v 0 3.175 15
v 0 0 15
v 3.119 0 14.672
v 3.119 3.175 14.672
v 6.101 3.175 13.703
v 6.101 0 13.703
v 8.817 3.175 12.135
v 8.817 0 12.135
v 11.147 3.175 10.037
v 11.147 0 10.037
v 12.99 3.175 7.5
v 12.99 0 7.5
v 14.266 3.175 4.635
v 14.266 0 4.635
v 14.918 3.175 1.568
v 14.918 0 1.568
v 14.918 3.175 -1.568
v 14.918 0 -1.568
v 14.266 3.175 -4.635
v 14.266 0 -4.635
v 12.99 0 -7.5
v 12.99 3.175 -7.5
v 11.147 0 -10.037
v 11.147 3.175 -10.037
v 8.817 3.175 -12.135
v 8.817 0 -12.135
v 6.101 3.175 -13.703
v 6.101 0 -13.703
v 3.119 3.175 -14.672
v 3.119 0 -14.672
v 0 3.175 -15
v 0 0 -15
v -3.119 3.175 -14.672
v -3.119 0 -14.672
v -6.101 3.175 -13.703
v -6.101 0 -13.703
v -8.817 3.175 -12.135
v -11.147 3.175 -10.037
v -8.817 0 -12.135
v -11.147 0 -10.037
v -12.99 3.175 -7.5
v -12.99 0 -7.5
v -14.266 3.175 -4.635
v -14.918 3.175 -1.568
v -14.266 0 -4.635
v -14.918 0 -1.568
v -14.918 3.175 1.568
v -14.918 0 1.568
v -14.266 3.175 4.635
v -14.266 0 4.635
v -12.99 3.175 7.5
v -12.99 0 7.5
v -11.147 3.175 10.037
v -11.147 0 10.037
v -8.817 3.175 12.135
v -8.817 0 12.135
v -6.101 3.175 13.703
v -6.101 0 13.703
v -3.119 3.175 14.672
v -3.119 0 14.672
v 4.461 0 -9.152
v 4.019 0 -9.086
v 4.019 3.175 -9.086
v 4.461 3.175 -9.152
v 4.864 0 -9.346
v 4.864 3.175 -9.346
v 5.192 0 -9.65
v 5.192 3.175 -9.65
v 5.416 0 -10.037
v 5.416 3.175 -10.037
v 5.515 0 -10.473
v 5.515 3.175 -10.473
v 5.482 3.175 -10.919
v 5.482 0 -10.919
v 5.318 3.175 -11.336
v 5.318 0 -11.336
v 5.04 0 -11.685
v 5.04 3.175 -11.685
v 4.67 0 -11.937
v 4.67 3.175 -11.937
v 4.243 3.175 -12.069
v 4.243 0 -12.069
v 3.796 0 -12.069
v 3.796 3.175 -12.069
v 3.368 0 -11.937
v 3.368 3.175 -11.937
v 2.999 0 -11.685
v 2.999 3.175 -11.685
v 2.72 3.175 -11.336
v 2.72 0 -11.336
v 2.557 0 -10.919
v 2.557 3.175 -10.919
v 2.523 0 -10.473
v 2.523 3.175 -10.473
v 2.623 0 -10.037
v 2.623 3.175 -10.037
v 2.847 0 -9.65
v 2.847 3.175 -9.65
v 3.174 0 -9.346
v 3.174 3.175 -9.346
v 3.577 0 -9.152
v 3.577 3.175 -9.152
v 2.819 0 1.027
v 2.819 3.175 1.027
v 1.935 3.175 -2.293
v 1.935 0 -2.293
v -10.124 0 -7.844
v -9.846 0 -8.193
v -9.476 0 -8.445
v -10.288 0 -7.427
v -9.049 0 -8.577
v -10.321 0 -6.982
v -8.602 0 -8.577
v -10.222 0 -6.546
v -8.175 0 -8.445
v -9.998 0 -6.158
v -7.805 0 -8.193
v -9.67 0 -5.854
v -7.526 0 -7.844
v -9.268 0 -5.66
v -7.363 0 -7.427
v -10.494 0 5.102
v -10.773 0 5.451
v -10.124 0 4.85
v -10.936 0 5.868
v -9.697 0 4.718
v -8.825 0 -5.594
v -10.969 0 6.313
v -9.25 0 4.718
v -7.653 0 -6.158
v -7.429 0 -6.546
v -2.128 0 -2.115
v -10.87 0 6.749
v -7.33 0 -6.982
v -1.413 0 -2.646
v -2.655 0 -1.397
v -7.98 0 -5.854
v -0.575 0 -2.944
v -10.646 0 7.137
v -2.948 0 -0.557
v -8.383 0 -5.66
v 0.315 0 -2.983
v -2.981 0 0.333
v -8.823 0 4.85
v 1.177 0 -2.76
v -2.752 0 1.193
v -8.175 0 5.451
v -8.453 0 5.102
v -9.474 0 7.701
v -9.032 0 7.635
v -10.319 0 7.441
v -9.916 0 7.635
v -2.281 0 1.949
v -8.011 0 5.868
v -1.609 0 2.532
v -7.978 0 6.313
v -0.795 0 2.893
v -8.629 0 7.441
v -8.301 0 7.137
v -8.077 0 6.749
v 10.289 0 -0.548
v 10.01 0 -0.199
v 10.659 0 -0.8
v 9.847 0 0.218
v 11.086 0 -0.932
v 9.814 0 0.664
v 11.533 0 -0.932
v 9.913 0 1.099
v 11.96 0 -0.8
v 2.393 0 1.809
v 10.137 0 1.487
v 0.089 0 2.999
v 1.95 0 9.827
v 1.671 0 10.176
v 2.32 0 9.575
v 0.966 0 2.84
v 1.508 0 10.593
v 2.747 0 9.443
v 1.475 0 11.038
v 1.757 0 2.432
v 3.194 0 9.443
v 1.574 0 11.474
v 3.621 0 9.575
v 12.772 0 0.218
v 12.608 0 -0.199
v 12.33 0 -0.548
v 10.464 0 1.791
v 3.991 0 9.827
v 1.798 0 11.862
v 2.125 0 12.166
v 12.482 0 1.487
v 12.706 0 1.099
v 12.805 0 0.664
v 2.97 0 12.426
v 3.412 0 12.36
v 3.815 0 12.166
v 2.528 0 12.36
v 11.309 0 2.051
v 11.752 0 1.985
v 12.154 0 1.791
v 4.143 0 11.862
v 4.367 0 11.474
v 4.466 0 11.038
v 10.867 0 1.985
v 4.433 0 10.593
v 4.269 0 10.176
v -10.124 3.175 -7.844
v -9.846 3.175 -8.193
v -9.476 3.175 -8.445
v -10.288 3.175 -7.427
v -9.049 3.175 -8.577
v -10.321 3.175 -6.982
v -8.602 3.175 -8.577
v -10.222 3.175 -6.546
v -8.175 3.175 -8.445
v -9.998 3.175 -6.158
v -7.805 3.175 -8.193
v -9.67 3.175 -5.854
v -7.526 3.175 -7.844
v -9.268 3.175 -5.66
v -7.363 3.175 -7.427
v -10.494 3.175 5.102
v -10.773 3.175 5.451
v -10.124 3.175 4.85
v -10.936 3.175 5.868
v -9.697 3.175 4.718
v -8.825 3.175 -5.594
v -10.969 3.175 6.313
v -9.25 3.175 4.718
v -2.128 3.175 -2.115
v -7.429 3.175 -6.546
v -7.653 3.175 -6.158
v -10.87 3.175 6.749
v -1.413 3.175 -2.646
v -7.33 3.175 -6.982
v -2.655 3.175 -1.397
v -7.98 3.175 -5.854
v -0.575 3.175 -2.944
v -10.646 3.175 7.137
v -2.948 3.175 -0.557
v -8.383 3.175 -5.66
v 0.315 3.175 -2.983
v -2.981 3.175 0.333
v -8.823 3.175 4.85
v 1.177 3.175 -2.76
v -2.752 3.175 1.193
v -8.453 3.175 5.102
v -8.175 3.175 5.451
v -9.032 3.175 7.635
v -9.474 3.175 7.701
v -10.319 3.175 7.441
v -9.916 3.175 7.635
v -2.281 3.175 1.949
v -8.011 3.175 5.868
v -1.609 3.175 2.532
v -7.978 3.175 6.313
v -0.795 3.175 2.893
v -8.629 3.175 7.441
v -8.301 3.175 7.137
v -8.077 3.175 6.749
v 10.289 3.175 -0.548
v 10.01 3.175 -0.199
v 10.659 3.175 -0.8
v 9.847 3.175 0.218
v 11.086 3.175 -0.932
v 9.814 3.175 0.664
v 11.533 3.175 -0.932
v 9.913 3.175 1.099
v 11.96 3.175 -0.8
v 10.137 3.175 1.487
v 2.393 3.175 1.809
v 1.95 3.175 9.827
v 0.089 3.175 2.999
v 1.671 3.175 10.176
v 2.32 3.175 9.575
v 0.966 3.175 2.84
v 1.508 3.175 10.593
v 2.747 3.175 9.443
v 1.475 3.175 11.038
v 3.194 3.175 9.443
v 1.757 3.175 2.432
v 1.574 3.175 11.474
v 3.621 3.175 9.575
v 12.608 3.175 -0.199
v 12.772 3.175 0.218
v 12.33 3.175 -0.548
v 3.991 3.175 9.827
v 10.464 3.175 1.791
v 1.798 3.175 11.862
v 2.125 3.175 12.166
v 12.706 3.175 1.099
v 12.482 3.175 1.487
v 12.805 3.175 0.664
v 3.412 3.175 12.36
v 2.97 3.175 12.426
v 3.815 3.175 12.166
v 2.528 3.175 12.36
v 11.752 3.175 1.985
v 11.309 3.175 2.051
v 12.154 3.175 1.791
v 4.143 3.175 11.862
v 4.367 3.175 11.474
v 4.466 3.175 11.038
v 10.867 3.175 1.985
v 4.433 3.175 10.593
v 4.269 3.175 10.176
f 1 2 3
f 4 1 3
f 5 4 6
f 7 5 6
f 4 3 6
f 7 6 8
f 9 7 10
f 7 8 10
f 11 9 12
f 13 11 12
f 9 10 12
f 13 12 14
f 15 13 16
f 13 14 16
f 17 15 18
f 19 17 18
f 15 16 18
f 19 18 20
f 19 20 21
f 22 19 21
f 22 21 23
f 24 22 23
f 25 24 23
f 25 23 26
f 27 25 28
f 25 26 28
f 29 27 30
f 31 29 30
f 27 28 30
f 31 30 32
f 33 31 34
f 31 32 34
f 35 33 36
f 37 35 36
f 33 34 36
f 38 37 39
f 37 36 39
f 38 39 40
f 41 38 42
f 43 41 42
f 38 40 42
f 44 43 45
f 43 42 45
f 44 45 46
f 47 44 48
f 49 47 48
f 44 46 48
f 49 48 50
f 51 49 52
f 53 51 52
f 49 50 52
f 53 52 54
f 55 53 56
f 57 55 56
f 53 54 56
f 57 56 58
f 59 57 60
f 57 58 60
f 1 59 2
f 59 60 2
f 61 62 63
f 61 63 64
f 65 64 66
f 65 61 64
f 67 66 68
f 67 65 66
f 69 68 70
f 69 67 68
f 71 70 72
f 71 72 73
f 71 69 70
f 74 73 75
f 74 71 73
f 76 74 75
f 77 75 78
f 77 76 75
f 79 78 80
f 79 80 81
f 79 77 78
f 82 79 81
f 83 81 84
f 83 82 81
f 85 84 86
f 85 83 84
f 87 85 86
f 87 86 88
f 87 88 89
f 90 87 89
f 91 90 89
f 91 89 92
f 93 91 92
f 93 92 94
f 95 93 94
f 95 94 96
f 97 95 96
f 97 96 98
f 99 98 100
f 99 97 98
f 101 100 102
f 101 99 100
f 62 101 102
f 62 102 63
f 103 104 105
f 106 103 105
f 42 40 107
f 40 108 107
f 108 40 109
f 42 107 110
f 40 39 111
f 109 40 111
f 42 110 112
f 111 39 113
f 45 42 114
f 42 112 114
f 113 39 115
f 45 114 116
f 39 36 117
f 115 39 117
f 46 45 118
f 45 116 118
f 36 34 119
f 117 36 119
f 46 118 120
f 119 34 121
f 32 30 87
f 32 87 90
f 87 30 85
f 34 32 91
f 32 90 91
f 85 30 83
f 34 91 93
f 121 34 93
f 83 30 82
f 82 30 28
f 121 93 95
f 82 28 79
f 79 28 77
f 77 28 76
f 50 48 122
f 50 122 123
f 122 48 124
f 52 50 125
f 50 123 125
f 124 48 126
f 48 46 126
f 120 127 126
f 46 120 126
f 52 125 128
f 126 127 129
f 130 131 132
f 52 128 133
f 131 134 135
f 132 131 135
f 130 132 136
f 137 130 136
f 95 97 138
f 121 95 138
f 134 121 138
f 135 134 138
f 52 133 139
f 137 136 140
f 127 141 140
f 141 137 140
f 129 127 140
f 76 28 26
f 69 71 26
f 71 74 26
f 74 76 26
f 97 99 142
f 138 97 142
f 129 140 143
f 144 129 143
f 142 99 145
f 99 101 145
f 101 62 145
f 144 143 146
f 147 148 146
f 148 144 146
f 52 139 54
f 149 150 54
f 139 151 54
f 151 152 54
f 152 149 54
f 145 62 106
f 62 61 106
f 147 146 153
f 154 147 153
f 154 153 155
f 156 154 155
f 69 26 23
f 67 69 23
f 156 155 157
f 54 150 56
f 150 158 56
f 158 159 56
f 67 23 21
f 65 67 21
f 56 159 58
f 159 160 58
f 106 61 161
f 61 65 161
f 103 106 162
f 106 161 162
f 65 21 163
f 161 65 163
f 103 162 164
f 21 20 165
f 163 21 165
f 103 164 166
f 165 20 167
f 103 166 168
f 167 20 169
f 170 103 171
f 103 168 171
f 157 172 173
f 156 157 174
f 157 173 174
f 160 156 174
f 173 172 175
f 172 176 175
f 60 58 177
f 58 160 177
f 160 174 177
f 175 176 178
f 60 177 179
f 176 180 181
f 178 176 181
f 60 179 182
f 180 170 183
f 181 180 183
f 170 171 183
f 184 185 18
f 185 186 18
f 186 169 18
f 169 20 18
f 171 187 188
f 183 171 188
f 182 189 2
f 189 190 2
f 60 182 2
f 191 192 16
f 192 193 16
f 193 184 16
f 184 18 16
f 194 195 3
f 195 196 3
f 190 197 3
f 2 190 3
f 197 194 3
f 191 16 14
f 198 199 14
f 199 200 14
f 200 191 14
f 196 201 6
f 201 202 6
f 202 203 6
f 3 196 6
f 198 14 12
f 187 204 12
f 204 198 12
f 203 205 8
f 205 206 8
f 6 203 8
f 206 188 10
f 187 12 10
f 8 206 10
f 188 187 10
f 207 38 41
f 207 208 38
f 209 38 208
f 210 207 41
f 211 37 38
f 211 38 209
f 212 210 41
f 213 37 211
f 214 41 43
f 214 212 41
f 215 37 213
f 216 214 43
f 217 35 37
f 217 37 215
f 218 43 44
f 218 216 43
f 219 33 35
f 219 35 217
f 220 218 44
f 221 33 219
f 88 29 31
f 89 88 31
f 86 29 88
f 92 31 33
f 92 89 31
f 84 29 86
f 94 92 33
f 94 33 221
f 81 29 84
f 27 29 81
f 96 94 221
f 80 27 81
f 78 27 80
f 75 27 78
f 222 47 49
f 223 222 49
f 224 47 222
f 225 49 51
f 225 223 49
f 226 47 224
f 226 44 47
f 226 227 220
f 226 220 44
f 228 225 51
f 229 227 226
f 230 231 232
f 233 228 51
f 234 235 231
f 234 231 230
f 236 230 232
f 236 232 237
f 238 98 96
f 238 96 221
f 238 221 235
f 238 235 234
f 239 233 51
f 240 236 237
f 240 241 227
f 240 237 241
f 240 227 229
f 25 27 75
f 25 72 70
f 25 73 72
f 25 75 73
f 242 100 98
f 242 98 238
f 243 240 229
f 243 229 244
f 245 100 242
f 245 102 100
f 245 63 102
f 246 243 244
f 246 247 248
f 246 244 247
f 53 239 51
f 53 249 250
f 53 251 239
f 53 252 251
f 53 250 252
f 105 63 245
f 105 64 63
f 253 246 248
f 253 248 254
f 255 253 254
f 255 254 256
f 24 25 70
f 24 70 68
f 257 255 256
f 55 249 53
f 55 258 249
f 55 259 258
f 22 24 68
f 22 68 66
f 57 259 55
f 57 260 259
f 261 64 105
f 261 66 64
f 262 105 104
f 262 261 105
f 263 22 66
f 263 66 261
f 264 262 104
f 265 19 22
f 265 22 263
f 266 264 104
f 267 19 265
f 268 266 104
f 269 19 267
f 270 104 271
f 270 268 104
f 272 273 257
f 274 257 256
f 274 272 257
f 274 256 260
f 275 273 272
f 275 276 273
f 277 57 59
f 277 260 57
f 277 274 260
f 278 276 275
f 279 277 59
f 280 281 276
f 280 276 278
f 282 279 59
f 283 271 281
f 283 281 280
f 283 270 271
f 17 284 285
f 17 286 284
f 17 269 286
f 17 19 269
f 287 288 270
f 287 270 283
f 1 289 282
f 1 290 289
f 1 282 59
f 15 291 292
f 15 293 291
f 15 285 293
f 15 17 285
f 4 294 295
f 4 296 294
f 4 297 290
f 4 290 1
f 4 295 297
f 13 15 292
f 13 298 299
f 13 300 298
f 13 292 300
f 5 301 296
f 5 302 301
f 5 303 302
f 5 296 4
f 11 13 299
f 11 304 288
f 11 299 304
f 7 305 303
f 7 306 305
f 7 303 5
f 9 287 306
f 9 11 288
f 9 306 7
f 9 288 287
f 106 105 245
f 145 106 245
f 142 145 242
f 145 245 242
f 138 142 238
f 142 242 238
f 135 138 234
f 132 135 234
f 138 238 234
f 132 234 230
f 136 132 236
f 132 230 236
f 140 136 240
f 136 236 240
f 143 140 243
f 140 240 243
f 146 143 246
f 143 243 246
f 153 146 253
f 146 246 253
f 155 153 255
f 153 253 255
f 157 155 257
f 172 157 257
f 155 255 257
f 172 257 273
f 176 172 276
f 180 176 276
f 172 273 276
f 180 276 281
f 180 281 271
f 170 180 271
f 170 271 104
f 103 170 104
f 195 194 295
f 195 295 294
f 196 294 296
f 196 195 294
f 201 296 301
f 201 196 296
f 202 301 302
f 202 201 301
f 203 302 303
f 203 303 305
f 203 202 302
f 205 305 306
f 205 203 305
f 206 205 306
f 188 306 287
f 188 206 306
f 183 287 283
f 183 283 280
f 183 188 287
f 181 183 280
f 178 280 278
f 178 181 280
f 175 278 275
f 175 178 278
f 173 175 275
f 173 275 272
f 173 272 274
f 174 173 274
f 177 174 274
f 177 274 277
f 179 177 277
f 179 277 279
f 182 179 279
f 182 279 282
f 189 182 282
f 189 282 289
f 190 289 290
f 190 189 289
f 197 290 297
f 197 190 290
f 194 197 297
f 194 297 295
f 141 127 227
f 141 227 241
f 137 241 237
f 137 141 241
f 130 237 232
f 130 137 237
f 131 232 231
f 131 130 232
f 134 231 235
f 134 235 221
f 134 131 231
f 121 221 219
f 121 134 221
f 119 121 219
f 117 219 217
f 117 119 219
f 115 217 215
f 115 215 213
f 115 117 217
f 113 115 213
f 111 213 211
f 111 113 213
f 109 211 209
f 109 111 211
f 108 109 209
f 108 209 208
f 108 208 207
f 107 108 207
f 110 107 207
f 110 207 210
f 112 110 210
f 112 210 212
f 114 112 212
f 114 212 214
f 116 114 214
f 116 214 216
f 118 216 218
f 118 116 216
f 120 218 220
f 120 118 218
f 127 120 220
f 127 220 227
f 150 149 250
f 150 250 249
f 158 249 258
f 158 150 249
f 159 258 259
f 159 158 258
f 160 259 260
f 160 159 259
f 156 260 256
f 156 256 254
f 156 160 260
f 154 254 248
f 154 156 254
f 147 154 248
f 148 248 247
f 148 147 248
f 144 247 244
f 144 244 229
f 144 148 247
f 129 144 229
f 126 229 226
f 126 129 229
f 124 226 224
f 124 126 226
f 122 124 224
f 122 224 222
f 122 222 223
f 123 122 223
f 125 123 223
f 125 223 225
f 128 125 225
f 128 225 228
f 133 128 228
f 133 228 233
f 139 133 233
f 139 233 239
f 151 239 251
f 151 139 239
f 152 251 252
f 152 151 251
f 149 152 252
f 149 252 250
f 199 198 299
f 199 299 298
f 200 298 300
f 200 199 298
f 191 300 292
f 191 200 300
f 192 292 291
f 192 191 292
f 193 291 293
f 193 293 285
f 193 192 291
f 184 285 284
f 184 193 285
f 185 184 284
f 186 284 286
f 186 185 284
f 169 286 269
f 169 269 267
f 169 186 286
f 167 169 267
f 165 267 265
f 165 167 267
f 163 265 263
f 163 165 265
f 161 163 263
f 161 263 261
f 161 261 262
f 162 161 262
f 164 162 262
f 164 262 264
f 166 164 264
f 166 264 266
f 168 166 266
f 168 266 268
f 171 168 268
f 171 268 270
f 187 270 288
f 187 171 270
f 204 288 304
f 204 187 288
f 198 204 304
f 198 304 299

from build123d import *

# Parameters (mm, degrees)
SKETCH1_R           = 15
SKETCH1_R_2         = 1.5
BOSS_EXTRUDE1_DEPTH = 3.175
CUT_EXTRUDE1_DEPTH  = 3.175


with BuildPart() as part:
    # Sketch1 → Boss-Extrude1 (new body)
    with BuildSketch(Plane(origin=(0, 0, 0), x_dir=(1, 0, 0), z_dir=(0, 1, 0))):
        with Locations(Location((0, 0, 0), (0, 0, 270))):
            Circle(SKETCH1_R)
        with Locations(Location((-8.825381331, 7.093668739, 0), (0, 0, 270))):
            Circle(SKETCH1_R_2, mode=Mode.SUBTRACT)
        with Locations(Location((4.019287066, 10.585500617, 0), (0, 0, 270))):
            Circle(SKETCH1_R_2, mode=Mode.SUBTRACT)
        with Locations(Location((11.309437348, -0.55146957, 0), (0, 0, 270))):
            Circle(SKETCH1_R_2, mode=Mode.SUBTRACT)
        with Locations(Location((2.970329609, -10.926327555, 0), (0, 0, 270))):
            Circle(SKETCH1_R_2, mode=Mode.SUBTRACT)
        with Locations(Location((-9.473672692, -6.201372231, 0), (0, 0, 270))):
            Circle(SKETCH1_R_2, mode=Mode.SUBTRACT)
    extrude(amount=BOSS_EXTRUDE1_DEPTH)

    # Sketch2 → Cut-Extrude1 (cut)
    with BuildSketch(Plane(origin=(0, 3.175, 0), x_dir=(1, 0, 0), z_dir=(0, 1, 0))):
        with BuildLine():
            Line((2.818653923, -1.027224446), (1.934730022, 2.292775554))
            ThreePointArc((1.934730022, 2.292775554), (-2.899010992, -0.771838887), (2.818653923, -1.027224446))
        make_face()
    extrude(amount=-CUT_EXTRUDE1_DEPTH, mode=Mode.SUBTRACT)


solid = part.part
